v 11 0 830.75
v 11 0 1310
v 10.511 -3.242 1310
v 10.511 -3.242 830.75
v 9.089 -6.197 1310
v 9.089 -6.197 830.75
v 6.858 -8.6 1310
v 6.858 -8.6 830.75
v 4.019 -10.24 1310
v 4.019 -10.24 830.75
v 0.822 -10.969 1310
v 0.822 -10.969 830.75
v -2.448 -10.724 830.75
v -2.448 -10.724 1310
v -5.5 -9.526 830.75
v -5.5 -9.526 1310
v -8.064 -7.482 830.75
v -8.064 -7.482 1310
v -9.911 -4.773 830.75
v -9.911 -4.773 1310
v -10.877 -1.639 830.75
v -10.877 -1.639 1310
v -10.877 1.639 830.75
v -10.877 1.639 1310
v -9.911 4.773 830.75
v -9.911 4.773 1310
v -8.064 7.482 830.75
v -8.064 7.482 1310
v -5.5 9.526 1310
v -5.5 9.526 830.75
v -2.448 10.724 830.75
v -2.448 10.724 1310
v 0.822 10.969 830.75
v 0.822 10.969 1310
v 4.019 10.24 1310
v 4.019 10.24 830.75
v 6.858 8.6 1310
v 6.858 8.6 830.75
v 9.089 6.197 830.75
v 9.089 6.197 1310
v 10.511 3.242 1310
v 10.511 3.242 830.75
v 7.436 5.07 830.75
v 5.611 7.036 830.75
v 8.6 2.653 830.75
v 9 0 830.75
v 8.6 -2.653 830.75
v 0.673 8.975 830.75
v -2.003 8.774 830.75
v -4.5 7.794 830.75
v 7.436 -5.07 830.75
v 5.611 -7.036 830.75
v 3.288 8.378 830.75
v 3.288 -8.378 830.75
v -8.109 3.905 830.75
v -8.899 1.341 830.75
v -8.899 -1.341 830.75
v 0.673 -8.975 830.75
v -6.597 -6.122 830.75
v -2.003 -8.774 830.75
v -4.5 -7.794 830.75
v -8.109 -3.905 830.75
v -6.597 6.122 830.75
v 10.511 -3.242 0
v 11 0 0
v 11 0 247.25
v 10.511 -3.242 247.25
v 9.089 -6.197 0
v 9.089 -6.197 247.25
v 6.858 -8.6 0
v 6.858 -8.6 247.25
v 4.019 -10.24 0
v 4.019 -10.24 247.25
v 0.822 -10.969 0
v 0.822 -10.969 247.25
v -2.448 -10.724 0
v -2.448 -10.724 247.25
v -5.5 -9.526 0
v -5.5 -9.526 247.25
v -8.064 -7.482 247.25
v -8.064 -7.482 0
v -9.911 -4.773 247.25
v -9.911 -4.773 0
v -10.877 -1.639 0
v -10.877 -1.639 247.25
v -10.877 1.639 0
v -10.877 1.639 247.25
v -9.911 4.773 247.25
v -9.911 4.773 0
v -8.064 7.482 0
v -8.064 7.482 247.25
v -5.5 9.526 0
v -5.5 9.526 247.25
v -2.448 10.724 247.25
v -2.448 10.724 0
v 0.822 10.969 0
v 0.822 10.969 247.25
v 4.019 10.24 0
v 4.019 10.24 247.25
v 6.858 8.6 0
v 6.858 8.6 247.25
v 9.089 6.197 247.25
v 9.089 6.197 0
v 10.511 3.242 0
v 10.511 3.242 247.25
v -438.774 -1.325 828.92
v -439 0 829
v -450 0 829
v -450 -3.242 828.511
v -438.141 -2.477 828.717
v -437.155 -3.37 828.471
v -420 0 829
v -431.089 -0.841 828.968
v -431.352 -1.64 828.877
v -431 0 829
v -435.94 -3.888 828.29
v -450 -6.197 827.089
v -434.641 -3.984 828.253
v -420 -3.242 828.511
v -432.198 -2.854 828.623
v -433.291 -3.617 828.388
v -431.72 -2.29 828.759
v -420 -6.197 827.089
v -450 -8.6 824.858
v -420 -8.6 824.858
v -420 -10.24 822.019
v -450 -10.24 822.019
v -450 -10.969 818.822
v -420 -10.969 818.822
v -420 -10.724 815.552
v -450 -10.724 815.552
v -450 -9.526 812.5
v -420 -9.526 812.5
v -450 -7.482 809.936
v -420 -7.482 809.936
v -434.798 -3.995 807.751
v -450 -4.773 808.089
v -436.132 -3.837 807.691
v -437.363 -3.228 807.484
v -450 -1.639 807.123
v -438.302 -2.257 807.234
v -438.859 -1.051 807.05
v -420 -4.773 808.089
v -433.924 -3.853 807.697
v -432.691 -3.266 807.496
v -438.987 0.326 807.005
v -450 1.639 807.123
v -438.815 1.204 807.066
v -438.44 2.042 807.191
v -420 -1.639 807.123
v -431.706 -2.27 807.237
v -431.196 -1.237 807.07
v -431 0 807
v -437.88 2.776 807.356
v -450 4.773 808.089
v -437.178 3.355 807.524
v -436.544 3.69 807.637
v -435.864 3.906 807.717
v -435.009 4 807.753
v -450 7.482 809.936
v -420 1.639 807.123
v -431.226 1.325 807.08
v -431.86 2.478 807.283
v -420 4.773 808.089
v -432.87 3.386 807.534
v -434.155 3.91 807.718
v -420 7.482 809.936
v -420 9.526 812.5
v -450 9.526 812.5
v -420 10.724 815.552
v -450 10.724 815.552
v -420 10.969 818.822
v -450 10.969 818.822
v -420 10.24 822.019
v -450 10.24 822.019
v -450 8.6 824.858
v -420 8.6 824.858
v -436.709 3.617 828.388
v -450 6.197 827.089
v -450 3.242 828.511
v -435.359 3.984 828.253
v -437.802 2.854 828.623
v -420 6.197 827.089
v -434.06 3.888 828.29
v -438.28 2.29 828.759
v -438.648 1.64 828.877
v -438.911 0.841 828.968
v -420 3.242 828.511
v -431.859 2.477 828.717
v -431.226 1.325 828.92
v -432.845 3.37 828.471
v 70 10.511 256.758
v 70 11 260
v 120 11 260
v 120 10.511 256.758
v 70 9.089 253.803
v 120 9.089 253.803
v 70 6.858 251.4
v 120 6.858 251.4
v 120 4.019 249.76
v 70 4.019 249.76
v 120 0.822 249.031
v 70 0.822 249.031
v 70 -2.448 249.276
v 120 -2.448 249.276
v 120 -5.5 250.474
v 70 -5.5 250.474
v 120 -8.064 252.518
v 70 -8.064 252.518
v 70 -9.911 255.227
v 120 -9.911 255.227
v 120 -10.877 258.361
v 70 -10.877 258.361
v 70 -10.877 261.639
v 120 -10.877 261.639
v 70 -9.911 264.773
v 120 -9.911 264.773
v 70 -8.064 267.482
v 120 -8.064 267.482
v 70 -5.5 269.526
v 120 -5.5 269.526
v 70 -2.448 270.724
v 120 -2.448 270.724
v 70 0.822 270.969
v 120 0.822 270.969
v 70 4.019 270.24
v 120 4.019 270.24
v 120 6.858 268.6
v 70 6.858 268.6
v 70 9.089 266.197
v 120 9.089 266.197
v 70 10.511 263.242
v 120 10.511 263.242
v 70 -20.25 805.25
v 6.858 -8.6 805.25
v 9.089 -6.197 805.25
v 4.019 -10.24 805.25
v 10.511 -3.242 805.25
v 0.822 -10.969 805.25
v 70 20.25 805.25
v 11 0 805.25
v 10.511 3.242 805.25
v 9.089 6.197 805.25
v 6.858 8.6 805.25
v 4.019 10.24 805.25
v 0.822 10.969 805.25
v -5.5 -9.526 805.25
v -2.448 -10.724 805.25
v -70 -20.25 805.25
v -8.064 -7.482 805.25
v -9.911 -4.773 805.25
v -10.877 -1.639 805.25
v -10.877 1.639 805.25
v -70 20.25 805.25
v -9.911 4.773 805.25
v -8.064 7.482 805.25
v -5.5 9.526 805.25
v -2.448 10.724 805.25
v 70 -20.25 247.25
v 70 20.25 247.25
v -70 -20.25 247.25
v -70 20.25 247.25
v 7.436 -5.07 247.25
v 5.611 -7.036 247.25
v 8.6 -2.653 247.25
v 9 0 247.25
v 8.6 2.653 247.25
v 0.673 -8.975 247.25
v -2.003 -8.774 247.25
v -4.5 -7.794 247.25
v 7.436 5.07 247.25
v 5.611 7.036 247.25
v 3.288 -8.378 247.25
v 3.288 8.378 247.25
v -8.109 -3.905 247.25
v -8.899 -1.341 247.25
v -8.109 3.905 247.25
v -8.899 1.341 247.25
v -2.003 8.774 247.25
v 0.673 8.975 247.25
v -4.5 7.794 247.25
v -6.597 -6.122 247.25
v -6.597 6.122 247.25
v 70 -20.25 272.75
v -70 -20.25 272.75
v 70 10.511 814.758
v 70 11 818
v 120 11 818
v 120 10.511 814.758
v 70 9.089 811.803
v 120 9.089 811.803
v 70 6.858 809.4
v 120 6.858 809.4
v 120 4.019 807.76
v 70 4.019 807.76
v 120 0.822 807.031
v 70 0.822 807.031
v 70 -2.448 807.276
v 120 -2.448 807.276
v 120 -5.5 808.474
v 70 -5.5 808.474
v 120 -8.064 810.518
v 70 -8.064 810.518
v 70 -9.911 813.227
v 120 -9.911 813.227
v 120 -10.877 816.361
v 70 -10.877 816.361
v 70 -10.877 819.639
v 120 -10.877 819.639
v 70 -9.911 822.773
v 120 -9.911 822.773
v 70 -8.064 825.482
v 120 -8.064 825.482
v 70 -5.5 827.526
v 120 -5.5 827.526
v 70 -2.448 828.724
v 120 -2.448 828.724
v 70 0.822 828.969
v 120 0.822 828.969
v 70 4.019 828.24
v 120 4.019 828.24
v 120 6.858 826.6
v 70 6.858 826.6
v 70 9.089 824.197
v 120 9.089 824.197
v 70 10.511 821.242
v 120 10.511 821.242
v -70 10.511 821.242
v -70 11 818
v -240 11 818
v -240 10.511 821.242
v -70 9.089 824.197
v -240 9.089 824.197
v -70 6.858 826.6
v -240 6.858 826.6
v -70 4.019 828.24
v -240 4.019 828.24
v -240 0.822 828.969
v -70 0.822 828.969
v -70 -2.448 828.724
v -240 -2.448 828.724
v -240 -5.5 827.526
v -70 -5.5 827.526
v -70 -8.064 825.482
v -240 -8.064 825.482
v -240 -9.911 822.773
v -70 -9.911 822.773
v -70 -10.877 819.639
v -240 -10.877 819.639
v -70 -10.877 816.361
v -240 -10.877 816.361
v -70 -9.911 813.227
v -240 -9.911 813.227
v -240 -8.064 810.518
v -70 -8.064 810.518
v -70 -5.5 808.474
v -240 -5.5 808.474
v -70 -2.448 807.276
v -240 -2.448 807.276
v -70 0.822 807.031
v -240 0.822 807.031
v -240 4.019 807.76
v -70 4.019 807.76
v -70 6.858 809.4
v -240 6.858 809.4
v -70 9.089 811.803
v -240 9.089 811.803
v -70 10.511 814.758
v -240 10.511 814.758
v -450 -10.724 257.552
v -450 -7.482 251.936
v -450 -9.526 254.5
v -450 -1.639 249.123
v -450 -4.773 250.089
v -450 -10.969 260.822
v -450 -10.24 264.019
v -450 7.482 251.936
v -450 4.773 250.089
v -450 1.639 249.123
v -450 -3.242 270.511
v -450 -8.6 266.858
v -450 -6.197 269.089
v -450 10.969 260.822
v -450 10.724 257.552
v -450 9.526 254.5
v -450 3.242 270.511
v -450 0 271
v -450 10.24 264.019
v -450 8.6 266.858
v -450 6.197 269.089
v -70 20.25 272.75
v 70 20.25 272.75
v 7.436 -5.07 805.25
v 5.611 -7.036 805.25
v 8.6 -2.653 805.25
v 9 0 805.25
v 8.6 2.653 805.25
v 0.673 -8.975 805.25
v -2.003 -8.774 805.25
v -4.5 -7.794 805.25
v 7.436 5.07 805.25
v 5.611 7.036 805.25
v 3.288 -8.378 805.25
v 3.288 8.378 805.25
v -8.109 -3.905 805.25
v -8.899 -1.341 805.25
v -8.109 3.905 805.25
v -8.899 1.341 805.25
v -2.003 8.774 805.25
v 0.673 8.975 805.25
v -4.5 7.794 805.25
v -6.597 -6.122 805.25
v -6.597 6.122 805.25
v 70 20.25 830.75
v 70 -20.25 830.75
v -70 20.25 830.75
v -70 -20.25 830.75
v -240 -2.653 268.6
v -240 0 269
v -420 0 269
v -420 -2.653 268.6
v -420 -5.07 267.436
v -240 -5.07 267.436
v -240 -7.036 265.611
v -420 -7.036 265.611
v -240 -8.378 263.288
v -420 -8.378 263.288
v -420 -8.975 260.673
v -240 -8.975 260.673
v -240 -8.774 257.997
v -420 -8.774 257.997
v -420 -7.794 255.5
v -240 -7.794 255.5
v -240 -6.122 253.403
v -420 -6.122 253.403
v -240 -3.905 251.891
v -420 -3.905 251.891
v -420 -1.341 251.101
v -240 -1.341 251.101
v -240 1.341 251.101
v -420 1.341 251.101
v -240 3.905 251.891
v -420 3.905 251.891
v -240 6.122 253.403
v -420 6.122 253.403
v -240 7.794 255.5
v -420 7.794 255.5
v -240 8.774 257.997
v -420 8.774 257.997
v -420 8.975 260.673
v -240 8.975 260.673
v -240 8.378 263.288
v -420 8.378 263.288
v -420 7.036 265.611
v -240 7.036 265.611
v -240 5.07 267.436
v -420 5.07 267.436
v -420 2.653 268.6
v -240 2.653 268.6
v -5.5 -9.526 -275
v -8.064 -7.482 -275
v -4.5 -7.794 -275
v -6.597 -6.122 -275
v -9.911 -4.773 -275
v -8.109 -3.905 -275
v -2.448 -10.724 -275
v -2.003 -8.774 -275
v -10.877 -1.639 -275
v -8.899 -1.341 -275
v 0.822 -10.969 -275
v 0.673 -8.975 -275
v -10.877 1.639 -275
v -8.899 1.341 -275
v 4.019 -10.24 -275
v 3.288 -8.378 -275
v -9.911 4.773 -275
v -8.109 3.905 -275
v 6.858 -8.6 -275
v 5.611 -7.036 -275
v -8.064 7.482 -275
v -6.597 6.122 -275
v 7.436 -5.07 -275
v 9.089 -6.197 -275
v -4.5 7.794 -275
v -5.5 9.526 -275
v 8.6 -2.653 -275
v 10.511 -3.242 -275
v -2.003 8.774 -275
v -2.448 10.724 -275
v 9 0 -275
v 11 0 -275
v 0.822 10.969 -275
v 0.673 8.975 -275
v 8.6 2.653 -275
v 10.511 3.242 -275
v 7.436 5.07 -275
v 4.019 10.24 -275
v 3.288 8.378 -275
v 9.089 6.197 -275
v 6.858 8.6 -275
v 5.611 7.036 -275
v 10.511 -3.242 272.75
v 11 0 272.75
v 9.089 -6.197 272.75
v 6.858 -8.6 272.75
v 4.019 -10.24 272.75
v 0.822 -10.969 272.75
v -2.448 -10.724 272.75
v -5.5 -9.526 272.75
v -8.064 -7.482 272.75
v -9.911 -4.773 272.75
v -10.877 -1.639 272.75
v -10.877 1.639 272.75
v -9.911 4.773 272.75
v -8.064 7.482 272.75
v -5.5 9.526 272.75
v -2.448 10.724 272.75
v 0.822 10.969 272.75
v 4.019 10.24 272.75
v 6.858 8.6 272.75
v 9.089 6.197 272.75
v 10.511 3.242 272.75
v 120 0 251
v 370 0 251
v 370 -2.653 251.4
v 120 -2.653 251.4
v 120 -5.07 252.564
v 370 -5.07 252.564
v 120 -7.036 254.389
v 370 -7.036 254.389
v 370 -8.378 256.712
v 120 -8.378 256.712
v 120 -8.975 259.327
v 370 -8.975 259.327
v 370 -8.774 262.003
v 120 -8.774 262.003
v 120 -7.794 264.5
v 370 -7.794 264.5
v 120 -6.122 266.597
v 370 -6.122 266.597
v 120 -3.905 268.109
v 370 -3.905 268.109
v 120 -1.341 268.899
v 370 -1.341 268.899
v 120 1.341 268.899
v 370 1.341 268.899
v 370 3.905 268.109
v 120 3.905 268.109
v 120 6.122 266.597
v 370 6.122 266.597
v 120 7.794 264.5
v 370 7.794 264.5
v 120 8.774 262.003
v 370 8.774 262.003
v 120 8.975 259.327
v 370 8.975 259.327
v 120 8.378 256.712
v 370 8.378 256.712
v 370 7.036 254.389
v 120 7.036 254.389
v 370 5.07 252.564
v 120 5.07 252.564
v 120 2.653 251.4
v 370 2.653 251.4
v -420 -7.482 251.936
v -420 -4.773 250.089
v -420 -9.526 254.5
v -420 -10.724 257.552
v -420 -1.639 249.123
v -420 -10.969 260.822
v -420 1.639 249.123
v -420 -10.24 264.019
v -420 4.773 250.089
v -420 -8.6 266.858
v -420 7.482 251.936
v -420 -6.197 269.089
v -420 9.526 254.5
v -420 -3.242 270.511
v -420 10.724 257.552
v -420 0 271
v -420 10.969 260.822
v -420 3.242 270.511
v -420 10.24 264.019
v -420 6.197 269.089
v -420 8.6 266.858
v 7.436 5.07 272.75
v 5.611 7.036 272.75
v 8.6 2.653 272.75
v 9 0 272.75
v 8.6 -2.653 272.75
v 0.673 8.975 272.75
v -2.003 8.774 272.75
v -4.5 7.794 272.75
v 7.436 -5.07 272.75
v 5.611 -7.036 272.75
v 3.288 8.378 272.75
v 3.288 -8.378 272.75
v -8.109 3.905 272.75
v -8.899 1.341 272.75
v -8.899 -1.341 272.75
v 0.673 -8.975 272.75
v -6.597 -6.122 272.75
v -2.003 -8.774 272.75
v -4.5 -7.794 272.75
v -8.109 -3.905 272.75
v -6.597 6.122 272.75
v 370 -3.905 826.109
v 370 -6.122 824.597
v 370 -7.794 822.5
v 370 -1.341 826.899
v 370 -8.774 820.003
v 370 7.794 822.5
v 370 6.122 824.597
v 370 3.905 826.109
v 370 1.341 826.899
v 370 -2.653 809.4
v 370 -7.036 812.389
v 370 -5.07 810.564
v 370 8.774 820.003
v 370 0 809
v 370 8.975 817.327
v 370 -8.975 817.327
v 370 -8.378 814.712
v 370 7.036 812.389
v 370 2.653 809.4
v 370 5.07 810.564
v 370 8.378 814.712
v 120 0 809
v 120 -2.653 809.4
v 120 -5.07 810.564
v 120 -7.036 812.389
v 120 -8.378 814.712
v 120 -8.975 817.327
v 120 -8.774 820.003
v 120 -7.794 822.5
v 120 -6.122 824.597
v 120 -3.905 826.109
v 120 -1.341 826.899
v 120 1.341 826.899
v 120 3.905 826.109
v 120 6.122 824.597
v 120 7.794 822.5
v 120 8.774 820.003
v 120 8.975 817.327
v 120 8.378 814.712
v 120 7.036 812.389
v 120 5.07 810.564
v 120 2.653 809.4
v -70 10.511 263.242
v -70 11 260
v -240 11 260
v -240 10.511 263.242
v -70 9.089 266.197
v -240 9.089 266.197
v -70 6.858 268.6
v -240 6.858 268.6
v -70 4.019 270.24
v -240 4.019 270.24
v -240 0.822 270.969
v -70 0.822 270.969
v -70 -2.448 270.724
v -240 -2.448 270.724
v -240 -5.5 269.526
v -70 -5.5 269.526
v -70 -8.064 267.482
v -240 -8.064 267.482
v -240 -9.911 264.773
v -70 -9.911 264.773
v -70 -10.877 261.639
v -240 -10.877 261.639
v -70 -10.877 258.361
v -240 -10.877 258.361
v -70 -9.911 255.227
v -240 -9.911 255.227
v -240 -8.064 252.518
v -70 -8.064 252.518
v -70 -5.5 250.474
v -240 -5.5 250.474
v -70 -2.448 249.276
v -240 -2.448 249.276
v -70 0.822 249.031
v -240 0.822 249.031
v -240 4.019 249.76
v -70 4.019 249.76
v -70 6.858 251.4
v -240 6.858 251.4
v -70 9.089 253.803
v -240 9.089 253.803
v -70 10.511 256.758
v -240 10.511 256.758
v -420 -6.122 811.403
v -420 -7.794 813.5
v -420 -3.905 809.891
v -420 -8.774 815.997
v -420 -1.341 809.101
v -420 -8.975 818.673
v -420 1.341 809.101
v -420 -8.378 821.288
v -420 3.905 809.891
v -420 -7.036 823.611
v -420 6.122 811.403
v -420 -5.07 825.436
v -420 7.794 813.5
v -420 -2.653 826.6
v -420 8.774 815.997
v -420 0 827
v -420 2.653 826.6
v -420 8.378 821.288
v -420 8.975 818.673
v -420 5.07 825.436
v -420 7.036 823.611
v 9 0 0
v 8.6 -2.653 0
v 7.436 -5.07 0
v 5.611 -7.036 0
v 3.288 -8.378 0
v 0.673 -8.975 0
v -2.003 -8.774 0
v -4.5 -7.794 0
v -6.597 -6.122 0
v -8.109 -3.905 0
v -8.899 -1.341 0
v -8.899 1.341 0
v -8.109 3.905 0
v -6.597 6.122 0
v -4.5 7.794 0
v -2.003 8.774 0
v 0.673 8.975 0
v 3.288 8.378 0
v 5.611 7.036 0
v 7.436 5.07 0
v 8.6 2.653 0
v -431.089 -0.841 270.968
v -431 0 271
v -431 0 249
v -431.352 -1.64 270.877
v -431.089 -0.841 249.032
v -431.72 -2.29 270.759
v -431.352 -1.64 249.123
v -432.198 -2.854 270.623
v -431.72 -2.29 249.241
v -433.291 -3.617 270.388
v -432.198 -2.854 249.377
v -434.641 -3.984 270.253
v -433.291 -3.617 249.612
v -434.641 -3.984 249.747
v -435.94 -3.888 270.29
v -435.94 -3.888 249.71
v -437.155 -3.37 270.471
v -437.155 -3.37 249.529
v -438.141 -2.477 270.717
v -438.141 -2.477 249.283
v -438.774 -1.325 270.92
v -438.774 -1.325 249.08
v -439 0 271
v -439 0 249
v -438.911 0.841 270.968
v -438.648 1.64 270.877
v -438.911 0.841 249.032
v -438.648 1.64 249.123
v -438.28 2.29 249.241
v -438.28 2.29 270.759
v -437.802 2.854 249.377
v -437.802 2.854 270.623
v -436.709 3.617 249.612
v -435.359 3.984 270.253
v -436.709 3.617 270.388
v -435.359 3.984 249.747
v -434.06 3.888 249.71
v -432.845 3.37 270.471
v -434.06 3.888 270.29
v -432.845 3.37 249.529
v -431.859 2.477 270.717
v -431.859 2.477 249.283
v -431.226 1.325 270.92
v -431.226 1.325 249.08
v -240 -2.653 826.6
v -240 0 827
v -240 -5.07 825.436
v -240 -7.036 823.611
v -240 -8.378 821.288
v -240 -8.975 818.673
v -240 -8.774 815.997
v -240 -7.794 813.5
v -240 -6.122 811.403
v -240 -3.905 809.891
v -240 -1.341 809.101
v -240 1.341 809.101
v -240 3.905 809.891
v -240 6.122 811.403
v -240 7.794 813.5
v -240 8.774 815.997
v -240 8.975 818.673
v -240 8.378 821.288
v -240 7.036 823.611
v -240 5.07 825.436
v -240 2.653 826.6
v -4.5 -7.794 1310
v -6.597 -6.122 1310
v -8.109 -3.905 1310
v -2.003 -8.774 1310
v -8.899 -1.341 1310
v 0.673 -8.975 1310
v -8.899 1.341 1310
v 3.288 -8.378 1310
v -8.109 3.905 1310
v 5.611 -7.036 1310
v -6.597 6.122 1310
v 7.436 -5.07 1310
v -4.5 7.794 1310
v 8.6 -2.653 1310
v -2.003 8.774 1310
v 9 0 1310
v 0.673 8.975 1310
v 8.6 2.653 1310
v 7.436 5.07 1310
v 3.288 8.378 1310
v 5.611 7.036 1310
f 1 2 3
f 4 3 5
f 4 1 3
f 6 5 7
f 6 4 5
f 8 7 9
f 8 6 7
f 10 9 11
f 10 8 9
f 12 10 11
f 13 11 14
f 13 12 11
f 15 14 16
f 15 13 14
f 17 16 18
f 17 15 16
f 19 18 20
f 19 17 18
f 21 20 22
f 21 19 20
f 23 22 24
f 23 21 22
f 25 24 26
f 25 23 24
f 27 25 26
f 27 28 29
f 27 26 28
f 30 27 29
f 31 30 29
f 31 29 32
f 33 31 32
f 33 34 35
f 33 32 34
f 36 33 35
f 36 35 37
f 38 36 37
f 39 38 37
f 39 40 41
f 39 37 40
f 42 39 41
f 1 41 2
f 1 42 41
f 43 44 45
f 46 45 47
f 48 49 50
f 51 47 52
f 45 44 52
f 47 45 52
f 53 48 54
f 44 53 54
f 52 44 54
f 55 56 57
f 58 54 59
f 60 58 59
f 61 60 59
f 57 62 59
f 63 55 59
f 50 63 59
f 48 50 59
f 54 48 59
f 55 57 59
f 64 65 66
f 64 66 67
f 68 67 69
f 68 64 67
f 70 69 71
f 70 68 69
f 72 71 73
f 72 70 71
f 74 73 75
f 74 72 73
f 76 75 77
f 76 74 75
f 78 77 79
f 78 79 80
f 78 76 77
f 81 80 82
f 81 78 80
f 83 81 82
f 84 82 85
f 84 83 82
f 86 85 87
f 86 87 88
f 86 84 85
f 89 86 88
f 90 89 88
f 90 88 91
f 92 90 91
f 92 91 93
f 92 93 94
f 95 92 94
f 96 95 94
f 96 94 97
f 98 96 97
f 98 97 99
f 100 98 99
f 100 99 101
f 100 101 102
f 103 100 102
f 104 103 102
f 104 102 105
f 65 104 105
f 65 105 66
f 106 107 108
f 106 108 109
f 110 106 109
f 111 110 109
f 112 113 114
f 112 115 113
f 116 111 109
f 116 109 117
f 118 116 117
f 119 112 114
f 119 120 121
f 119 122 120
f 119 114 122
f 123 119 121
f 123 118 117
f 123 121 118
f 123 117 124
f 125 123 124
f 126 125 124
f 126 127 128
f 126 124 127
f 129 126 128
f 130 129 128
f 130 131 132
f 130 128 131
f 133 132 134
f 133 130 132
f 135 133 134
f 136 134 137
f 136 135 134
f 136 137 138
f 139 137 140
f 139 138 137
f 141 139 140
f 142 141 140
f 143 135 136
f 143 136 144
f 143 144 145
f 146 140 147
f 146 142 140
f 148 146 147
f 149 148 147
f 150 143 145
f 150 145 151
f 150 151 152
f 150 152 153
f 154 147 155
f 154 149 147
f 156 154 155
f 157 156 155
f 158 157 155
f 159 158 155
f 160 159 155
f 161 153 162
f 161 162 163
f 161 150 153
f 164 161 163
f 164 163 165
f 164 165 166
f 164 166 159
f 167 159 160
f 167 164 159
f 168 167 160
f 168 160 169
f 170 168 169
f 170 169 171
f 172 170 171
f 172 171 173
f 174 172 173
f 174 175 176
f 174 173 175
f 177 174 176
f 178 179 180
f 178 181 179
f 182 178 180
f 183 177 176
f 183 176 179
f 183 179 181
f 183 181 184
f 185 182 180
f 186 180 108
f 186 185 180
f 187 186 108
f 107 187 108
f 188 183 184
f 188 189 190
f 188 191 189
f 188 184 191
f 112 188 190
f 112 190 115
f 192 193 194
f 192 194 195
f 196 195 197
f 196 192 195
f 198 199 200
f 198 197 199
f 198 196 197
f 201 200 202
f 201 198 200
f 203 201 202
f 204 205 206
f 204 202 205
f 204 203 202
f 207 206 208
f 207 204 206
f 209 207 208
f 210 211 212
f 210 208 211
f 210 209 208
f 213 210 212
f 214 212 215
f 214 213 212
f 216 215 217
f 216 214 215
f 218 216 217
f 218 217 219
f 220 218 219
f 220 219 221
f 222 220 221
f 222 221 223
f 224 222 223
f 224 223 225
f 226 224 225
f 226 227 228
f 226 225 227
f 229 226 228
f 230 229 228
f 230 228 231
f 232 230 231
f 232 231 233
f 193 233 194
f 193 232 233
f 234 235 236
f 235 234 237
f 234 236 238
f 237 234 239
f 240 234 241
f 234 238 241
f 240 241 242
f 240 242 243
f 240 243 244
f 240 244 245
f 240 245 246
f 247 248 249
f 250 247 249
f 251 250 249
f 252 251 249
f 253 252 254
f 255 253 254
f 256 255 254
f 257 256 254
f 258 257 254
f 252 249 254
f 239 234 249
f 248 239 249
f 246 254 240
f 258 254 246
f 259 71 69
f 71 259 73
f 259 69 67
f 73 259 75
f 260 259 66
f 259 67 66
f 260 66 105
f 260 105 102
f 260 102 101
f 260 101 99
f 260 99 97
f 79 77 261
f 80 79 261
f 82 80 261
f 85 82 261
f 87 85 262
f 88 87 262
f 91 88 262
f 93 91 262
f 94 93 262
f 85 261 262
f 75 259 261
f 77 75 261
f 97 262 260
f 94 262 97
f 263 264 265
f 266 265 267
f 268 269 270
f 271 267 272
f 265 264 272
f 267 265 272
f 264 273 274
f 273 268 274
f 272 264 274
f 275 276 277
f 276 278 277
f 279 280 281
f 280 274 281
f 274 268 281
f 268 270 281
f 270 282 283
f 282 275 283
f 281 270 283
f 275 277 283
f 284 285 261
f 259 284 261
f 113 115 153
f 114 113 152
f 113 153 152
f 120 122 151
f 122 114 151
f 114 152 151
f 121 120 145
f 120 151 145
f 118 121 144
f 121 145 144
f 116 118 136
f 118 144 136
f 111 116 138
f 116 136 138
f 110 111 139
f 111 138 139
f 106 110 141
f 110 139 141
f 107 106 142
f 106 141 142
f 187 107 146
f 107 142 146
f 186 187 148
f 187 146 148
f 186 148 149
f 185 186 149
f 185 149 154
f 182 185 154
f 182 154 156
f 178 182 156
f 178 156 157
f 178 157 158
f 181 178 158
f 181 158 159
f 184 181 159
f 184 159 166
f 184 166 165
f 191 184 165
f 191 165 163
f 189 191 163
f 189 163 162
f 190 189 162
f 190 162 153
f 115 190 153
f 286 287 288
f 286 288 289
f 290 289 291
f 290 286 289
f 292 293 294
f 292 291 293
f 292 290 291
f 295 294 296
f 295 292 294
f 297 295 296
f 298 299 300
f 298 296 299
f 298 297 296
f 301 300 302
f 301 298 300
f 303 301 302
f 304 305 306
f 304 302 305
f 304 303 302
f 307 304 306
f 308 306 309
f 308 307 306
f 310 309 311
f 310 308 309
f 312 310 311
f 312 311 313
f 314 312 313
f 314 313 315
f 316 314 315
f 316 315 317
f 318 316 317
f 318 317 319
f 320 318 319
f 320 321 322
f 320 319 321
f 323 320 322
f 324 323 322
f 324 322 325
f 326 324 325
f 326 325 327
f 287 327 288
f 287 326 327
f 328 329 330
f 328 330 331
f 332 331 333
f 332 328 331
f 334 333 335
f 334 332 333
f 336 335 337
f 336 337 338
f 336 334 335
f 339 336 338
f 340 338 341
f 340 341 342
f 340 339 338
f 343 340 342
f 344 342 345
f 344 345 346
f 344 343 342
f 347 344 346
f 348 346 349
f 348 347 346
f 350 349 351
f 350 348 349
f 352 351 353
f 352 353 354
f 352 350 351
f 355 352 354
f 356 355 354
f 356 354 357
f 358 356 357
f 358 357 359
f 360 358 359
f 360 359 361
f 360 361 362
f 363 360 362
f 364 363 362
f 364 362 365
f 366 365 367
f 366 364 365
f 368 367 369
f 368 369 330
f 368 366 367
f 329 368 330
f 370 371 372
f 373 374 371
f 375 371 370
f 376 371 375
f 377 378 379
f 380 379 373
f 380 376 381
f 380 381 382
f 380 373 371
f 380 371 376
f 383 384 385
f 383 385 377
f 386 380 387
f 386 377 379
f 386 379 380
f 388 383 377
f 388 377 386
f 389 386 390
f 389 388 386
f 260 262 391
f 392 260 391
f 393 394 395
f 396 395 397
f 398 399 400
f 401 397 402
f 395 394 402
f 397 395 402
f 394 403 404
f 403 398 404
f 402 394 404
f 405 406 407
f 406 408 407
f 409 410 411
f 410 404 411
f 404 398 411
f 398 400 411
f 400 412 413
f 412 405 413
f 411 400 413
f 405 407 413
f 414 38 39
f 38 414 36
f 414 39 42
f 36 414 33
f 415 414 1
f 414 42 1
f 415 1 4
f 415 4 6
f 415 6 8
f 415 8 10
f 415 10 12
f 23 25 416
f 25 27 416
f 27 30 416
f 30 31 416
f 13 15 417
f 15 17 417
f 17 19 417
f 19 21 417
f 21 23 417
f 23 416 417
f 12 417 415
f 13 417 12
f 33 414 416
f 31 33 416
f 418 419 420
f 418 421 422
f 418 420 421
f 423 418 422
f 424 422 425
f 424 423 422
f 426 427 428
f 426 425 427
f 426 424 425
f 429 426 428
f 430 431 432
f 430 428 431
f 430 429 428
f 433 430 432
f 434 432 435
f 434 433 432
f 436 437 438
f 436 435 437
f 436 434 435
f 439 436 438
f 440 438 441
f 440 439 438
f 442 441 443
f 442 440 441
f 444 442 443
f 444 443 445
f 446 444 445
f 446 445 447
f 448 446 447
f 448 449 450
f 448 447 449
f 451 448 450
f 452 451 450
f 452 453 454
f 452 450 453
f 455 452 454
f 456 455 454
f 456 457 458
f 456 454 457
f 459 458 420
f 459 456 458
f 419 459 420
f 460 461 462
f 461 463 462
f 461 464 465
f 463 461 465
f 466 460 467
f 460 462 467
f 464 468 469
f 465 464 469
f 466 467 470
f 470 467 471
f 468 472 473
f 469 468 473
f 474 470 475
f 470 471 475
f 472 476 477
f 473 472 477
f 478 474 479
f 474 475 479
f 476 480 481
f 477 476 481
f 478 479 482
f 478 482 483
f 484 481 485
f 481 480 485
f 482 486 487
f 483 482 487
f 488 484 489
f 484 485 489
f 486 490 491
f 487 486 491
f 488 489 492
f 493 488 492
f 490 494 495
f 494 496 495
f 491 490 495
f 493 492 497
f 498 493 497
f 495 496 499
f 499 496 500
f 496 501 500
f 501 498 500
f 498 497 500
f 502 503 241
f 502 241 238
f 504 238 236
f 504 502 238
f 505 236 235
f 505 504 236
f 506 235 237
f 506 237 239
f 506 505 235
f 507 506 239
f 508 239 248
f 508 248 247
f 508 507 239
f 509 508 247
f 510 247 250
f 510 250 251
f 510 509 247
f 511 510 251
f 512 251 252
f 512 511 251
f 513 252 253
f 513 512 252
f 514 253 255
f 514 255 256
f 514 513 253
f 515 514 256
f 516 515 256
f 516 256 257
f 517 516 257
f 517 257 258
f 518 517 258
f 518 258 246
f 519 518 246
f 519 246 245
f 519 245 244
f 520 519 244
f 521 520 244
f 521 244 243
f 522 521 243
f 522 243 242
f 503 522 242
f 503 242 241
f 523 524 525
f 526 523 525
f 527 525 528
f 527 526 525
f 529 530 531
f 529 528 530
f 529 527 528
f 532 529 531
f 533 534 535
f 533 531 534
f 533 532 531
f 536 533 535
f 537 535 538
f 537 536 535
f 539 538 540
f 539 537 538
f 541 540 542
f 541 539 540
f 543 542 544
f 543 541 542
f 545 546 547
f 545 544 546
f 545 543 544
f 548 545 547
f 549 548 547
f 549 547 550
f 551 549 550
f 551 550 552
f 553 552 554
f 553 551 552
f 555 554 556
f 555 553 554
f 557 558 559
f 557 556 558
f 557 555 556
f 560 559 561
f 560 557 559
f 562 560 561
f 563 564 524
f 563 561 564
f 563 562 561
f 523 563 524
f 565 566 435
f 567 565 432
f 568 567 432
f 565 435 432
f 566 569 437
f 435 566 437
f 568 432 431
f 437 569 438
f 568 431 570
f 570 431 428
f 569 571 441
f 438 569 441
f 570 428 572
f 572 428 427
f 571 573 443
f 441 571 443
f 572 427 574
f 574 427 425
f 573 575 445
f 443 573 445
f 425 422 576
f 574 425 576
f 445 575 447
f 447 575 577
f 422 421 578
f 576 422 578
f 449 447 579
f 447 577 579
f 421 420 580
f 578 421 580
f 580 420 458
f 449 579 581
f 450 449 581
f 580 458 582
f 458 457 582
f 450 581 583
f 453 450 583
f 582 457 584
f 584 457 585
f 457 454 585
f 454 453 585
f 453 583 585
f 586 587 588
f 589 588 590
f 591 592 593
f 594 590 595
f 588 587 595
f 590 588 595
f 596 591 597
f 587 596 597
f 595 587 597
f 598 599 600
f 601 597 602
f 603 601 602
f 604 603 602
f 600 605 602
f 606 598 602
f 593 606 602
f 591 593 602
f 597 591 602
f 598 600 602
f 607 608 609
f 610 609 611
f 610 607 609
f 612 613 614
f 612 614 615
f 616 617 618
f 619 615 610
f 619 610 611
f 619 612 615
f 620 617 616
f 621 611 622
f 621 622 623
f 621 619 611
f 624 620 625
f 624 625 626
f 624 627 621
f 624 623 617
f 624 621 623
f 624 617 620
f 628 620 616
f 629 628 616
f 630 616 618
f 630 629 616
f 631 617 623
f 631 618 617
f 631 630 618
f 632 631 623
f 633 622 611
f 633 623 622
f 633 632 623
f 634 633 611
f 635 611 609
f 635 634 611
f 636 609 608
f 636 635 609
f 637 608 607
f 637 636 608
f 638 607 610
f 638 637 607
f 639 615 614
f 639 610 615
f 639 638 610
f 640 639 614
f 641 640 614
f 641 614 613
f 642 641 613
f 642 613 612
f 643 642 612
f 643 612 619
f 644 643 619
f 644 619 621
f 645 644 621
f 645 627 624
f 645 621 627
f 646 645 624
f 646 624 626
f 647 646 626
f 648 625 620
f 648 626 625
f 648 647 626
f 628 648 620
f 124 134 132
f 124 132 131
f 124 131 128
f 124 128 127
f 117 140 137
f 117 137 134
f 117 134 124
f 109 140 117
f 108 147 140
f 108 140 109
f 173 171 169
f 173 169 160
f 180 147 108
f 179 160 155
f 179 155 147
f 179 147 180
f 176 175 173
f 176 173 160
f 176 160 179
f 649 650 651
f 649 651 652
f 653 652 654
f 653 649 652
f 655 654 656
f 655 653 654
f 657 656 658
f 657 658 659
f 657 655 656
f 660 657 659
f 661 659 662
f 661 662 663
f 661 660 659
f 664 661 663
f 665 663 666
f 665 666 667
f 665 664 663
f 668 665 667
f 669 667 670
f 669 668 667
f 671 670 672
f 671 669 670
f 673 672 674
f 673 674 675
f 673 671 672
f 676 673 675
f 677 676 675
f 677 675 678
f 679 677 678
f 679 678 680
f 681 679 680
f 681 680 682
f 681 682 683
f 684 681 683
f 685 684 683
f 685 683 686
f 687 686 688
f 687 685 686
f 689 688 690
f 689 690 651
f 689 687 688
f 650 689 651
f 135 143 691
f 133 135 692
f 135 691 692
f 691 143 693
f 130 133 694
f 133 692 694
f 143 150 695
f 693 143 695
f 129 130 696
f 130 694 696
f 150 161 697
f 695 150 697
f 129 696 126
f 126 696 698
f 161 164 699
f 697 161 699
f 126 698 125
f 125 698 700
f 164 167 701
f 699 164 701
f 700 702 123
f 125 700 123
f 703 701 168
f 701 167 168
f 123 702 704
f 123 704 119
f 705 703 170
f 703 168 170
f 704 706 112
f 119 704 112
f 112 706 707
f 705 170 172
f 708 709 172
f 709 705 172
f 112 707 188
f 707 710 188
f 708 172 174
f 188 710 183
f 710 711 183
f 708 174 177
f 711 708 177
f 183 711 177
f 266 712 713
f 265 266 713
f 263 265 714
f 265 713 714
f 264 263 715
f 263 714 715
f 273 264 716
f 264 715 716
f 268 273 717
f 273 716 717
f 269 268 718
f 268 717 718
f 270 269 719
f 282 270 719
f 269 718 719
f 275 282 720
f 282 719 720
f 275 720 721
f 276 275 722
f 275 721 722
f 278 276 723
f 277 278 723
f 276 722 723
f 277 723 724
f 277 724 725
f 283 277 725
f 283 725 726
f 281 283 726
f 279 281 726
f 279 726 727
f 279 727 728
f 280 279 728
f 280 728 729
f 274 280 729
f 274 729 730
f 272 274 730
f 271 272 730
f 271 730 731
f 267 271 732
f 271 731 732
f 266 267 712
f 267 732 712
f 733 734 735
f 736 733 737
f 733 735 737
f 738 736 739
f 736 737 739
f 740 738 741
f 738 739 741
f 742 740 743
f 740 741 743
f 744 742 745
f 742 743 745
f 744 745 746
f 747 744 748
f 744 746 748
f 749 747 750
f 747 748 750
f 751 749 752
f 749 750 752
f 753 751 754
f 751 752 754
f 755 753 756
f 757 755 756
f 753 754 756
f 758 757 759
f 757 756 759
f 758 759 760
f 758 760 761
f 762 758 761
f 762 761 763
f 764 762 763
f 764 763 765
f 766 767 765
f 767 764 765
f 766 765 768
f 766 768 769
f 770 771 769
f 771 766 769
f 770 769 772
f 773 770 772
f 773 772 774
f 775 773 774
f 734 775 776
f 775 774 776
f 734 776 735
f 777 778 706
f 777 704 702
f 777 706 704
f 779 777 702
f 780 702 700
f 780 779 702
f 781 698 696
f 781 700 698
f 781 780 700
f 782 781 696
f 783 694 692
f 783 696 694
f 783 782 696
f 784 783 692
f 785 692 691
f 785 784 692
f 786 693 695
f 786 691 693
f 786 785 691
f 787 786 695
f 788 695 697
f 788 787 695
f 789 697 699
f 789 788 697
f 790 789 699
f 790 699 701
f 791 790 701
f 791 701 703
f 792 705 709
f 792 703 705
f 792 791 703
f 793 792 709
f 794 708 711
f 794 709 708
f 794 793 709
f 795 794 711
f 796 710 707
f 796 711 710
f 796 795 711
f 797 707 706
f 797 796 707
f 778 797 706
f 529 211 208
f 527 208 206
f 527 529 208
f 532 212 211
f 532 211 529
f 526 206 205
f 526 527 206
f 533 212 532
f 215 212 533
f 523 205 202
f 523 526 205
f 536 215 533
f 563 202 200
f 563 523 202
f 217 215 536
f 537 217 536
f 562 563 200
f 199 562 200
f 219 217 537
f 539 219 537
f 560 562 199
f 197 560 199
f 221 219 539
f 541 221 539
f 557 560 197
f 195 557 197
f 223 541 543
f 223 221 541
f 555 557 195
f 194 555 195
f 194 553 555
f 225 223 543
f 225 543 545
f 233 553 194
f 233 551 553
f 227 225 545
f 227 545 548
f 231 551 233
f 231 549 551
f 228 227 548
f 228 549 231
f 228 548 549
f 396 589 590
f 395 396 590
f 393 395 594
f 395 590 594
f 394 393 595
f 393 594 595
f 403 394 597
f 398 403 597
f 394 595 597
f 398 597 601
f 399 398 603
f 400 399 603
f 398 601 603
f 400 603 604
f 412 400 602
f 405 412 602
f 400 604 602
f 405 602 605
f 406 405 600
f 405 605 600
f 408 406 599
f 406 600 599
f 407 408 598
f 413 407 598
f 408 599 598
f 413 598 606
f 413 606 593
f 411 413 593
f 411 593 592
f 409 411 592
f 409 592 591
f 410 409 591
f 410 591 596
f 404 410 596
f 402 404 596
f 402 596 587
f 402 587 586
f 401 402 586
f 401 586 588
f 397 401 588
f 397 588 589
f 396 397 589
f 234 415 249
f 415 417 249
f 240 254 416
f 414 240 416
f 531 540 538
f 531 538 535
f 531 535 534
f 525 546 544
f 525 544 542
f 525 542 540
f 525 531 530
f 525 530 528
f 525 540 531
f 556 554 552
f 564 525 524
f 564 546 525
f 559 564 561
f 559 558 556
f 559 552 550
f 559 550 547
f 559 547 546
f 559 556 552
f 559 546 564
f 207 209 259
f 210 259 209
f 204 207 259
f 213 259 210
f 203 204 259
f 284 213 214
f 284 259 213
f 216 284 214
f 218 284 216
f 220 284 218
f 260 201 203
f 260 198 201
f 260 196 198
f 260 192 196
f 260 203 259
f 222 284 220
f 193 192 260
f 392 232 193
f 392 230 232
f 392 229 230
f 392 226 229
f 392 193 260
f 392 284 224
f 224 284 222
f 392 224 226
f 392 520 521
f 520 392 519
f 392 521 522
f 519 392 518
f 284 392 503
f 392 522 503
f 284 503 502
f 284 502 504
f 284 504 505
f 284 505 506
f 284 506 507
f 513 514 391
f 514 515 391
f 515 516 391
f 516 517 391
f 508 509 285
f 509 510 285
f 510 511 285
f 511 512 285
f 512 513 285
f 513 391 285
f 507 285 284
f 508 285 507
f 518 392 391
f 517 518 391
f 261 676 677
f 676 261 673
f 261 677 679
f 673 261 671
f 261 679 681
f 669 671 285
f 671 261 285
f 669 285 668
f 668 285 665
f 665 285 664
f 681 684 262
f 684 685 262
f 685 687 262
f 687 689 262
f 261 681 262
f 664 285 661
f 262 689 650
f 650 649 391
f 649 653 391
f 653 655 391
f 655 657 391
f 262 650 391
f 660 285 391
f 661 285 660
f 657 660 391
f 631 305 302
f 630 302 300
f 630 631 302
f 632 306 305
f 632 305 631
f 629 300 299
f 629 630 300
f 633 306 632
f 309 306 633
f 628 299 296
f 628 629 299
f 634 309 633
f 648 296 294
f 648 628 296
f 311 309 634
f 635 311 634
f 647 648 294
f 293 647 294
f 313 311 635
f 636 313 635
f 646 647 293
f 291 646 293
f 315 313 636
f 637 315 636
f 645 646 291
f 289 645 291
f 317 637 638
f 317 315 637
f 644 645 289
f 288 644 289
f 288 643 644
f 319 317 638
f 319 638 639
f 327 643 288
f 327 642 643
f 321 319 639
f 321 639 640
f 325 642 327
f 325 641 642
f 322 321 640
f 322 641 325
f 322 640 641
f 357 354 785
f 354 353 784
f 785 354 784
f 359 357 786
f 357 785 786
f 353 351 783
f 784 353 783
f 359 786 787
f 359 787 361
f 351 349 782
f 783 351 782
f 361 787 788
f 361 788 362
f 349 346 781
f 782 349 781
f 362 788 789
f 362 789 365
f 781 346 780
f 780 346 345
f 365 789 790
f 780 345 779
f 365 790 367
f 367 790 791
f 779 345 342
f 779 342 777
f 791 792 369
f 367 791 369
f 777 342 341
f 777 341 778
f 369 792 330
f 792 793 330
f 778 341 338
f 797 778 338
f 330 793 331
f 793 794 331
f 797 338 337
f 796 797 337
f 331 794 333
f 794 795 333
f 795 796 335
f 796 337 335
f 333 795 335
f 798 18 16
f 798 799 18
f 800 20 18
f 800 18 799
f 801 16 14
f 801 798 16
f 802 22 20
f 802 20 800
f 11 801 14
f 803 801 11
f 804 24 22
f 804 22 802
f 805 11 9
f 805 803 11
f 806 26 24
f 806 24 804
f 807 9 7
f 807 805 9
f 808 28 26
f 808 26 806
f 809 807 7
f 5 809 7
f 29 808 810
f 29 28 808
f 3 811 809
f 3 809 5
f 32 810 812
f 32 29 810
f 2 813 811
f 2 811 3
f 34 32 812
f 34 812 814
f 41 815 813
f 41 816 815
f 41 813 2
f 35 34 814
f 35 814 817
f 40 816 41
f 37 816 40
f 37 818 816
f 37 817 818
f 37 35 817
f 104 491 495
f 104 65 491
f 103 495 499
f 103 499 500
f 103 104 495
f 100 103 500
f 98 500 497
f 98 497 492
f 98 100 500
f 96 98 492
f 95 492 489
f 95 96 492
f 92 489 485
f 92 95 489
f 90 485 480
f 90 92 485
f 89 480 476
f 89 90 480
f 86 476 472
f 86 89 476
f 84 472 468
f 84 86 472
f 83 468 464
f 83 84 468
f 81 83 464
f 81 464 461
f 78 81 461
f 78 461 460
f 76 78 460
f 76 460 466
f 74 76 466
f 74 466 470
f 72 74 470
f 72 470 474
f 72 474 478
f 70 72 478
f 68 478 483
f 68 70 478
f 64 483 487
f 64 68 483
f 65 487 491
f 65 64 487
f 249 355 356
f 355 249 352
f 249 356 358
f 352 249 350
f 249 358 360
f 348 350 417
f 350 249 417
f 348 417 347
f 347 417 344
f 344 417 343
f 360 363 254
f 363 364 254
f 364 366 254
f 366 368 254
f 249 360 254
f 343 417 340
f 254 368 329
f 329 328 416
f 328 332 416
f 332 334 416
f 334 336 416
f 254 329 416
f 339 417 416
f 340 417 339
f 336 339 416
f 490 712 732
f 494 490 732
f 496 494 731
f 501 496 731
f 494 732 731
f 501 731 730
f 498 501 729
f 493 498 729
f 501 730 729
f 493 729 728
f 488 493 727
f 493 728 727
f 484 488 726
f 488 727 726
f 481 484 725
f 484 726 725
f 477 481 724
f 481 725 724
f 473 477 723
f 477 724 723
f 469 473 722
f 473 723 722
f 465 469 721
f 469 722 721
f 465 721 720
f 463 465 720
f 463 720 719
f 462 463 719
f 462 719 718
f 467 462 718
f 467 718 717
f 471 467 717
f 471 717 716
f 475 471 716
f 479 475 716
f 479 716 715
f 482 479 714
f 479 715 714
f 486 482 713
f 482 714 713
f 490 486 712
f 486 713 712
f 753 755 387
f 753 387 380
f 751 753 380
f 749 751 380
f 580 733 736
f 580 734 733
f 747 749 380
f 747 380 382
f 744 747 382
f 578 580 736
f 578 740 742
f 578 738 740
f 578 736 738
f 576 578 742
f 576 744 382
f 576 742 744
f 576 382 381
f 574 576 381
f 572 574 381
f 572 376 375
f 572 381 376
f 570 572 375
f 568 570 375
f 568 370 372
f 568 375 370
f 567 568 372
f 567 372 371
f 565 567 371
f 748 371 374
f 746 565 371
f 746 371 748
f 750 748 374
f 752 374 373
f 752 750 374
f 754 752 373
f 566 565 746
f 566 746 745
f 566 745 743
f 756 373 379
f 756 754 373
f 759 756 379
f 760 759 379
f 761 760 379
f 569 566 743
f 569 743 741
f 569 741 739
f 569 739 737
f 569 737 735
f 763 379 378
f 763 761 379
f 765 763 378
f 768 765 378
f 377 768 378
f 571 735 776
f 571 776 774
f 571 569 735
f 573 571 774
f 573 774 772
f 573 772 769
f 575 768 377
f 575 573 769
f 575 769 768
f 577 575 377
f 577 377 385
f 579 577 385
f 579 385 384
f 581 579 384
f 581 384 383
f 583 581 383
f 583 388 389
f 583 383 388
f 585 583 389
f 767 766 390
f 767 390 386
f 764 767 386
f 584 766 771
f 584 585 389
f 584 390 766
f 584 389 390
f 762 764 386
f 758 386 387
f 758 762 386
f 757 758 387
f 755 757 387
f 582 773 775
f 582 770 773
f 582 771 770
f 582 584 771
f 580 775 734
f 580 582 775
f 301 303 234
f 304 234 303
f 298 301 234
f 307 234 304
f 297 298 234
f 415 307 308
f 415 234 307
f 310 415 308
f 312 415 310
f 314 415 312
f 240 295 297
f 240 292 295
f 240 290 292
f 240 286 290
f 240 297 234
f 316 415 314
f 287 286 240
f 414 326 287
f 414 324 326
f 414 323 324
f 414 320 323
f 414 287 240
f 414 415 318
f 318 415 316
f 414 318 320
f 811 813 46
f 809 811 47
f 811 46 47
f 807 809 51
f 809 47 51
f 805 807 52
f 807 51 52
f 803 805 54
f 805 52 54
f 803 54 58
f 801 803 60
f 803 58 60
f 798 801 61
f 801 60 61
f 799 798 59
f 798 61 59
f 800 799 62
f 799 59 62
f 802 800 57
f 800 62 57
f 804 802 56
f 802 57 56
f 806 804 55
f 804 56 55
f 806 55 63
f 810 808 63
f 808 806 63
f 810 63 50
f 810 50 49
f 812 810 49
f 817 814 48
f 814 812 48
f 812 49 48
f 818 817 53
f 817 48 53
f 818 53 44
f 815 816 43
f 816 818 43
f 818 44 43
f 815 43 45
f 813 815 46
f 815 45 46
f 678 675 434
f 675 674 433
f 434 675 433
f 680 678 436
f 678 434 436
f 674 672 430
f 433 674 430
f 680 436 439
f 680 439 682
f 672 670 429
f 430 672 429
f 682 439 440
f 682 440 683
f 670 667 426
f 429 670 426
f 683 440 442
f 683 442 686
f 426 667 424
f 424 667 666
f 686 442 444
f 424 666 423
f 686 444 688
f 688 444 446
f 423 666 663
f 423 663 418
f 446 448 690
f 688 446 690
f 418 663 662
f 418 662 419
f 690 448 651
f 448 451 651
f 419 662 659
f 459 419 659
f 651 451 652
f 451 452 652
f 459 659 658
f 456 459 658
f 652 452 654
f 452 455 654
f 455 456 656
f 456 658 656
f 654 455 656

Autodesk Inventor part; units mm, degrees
ref_plane "YZ Plane" through (0, 0, 0) normal (1, 0, 0) x (0, 1, 0)
sketch "Sketch1" plane through (0, 0, 0) normal (0, 0, 1) x (1, 0, 0)
  circle A0 centre (0, 0) radius 11
  circle A1 centre (0, 0) radius 9
  dimension "d9" = 22
  dimension "d40" = 18
extrude "mast" add sketch "Sketch1" along normal blind 1310 and the other way blind 275
sketch "Sketch4" plane through (0, 0, 0) normal (1, 0, 0) x (0, 1, 0)
  circle A0 centre (0, 818) radius 11
  circle A1 centre (0, 260) radius 11
  line L0 (-20.25, 247.25) -> (20.25, 247.25)
  line L1 (20.25, 247.25) -> (20.25, 272.75)
  line L2 (20.25, 272.75) -> (-20.25, 272.75)
  line L3 (-20.25, 272.75) -> (-20.25, 247.25)
  line L4 (-20.25, 247.25) -> (20.25, 272.75) construction
  line L5 (20.25, 247.25) -> (-20.25, 272.75) construction
  line L6 (-20.25, 805.25) -> (20.25, 805.25)
  line L7 (20.25, 805.25) -> (20.25, 830.75)
  line L8 (20.25, 830.75) -> (-20.25, 830.75)
  line L9 (-20.25, 830.75) -> (-20.25, 805.25)
  line L10 (-20.25, 805.25) -> (20.25, 830.75) construction
  line L11 (20.25, 805.25) -> (-20.25, 830.75) construction
  point P0 (0, 0)
  dimension "d19" = 22
  dimension "d20" = 818
  dimension "d21" = 22
  dimension "d22" = 260
  dimension "d97" = 40.5
  dimension "d98" = 25.5
  dimension "d99" = 40.5
  dimension "d100" = 25.5
extrude "tail" add sketch "Sketch4" against normal blind 240 contours A0 | A1
sketch "Sketch8" plane through (-240, 0, 260) normal (-1, 0, 0) x (0, 0, 1)
  circle A0 centre (0, 0) radius 11 projected
  circle A1 centre (0, 0) radius 11
  circle A2 centre (0, 0) radius 9
  circle A3 centre (558, 0) radius 11 projected
  circle A4 centre (558, 0) radius 9
  dimension "d42" = 18
  dimension "d52" = 18
extrude "tail2" add sketch "Sketch8" along normal blind 180 contours A2 | A4
ref_plane "Work Plane4" through (0, 0, 249) normal (0, 0, 1) x (1, 0, 0)
sketch "Sketch11" plane through (-420, 0, 818) normal (-1, 0, 0) x (0, 0, 1)
  circle A0 centre (0, 0) radius 9 projected
  circle A1 centre (-558, 0) radius 11
  circle A2 centre (0, 0) radius 11
  circle A3 centre (0, 0) radius 7
  circle A4 centre (-558, 0) radius 9 projected
  point P0 (-818, 0)
  dimension "d53" = 22
  dimension "d54" = 22
  dimension "d58" = 14
extrude "tail3" add sketch "Sketch11" along normal blind 30 contours A0 | A1 | A2 | A3 | A4
ref_plane "Work Plane5" through (0, 0, 249) normal (0, 0, 1) x (1, 0, 0)
sketch "Sketch20" plane through (0, 0, 249) normal (0, 0, 1) x (1, 0, 0)
  circle A0 centre (-435, 0) radius 4
  line L0 (-450, 11) -> (-450, -11) projected
  line L1 (-450, 0) -> (-430, 0) construction
  point P0 (0, 0)
  dimension "d82" = 8
  dimension "d83" = 15
extrude "tail holes" cut sketch "Sketch20" along normal through all
sketch "Sketch14" plane through (0, 0, 260) normal (1, 0, 0) x (0, 1, 0)
  circle A0 centre (0, 558) radius 11 projected
  circle A1 centre (0, 0) radius 11 projected
  point P0 (0, -260)
extrude "weight" add sketch "Sketch14" along normal blind 120
sketch "Sketch21" plane through (120, 0, 260) normal (1, 0, 0) x (0, 0, -1)
  circle A0 centre (0, 0) radius 11 projected
  circle A1 centre (0, 0) radius 9
  circle A2 centre (-558, 0) radius 11 projected
  circle A3 centre (-558, 0) radius 9
  point P0 (260, 0)
  dimension "d88" = 18
  dimension "d89" = 18
extrude "weight2" add sketch "Sketch21" along normal blind 250 contours A1 | A3
extrude "reinforcement tube" add sketch "Sketch4" along normal mid plane 140
equation "\"tail_height\" = 530"
properties part number "sail_skeleton2"
